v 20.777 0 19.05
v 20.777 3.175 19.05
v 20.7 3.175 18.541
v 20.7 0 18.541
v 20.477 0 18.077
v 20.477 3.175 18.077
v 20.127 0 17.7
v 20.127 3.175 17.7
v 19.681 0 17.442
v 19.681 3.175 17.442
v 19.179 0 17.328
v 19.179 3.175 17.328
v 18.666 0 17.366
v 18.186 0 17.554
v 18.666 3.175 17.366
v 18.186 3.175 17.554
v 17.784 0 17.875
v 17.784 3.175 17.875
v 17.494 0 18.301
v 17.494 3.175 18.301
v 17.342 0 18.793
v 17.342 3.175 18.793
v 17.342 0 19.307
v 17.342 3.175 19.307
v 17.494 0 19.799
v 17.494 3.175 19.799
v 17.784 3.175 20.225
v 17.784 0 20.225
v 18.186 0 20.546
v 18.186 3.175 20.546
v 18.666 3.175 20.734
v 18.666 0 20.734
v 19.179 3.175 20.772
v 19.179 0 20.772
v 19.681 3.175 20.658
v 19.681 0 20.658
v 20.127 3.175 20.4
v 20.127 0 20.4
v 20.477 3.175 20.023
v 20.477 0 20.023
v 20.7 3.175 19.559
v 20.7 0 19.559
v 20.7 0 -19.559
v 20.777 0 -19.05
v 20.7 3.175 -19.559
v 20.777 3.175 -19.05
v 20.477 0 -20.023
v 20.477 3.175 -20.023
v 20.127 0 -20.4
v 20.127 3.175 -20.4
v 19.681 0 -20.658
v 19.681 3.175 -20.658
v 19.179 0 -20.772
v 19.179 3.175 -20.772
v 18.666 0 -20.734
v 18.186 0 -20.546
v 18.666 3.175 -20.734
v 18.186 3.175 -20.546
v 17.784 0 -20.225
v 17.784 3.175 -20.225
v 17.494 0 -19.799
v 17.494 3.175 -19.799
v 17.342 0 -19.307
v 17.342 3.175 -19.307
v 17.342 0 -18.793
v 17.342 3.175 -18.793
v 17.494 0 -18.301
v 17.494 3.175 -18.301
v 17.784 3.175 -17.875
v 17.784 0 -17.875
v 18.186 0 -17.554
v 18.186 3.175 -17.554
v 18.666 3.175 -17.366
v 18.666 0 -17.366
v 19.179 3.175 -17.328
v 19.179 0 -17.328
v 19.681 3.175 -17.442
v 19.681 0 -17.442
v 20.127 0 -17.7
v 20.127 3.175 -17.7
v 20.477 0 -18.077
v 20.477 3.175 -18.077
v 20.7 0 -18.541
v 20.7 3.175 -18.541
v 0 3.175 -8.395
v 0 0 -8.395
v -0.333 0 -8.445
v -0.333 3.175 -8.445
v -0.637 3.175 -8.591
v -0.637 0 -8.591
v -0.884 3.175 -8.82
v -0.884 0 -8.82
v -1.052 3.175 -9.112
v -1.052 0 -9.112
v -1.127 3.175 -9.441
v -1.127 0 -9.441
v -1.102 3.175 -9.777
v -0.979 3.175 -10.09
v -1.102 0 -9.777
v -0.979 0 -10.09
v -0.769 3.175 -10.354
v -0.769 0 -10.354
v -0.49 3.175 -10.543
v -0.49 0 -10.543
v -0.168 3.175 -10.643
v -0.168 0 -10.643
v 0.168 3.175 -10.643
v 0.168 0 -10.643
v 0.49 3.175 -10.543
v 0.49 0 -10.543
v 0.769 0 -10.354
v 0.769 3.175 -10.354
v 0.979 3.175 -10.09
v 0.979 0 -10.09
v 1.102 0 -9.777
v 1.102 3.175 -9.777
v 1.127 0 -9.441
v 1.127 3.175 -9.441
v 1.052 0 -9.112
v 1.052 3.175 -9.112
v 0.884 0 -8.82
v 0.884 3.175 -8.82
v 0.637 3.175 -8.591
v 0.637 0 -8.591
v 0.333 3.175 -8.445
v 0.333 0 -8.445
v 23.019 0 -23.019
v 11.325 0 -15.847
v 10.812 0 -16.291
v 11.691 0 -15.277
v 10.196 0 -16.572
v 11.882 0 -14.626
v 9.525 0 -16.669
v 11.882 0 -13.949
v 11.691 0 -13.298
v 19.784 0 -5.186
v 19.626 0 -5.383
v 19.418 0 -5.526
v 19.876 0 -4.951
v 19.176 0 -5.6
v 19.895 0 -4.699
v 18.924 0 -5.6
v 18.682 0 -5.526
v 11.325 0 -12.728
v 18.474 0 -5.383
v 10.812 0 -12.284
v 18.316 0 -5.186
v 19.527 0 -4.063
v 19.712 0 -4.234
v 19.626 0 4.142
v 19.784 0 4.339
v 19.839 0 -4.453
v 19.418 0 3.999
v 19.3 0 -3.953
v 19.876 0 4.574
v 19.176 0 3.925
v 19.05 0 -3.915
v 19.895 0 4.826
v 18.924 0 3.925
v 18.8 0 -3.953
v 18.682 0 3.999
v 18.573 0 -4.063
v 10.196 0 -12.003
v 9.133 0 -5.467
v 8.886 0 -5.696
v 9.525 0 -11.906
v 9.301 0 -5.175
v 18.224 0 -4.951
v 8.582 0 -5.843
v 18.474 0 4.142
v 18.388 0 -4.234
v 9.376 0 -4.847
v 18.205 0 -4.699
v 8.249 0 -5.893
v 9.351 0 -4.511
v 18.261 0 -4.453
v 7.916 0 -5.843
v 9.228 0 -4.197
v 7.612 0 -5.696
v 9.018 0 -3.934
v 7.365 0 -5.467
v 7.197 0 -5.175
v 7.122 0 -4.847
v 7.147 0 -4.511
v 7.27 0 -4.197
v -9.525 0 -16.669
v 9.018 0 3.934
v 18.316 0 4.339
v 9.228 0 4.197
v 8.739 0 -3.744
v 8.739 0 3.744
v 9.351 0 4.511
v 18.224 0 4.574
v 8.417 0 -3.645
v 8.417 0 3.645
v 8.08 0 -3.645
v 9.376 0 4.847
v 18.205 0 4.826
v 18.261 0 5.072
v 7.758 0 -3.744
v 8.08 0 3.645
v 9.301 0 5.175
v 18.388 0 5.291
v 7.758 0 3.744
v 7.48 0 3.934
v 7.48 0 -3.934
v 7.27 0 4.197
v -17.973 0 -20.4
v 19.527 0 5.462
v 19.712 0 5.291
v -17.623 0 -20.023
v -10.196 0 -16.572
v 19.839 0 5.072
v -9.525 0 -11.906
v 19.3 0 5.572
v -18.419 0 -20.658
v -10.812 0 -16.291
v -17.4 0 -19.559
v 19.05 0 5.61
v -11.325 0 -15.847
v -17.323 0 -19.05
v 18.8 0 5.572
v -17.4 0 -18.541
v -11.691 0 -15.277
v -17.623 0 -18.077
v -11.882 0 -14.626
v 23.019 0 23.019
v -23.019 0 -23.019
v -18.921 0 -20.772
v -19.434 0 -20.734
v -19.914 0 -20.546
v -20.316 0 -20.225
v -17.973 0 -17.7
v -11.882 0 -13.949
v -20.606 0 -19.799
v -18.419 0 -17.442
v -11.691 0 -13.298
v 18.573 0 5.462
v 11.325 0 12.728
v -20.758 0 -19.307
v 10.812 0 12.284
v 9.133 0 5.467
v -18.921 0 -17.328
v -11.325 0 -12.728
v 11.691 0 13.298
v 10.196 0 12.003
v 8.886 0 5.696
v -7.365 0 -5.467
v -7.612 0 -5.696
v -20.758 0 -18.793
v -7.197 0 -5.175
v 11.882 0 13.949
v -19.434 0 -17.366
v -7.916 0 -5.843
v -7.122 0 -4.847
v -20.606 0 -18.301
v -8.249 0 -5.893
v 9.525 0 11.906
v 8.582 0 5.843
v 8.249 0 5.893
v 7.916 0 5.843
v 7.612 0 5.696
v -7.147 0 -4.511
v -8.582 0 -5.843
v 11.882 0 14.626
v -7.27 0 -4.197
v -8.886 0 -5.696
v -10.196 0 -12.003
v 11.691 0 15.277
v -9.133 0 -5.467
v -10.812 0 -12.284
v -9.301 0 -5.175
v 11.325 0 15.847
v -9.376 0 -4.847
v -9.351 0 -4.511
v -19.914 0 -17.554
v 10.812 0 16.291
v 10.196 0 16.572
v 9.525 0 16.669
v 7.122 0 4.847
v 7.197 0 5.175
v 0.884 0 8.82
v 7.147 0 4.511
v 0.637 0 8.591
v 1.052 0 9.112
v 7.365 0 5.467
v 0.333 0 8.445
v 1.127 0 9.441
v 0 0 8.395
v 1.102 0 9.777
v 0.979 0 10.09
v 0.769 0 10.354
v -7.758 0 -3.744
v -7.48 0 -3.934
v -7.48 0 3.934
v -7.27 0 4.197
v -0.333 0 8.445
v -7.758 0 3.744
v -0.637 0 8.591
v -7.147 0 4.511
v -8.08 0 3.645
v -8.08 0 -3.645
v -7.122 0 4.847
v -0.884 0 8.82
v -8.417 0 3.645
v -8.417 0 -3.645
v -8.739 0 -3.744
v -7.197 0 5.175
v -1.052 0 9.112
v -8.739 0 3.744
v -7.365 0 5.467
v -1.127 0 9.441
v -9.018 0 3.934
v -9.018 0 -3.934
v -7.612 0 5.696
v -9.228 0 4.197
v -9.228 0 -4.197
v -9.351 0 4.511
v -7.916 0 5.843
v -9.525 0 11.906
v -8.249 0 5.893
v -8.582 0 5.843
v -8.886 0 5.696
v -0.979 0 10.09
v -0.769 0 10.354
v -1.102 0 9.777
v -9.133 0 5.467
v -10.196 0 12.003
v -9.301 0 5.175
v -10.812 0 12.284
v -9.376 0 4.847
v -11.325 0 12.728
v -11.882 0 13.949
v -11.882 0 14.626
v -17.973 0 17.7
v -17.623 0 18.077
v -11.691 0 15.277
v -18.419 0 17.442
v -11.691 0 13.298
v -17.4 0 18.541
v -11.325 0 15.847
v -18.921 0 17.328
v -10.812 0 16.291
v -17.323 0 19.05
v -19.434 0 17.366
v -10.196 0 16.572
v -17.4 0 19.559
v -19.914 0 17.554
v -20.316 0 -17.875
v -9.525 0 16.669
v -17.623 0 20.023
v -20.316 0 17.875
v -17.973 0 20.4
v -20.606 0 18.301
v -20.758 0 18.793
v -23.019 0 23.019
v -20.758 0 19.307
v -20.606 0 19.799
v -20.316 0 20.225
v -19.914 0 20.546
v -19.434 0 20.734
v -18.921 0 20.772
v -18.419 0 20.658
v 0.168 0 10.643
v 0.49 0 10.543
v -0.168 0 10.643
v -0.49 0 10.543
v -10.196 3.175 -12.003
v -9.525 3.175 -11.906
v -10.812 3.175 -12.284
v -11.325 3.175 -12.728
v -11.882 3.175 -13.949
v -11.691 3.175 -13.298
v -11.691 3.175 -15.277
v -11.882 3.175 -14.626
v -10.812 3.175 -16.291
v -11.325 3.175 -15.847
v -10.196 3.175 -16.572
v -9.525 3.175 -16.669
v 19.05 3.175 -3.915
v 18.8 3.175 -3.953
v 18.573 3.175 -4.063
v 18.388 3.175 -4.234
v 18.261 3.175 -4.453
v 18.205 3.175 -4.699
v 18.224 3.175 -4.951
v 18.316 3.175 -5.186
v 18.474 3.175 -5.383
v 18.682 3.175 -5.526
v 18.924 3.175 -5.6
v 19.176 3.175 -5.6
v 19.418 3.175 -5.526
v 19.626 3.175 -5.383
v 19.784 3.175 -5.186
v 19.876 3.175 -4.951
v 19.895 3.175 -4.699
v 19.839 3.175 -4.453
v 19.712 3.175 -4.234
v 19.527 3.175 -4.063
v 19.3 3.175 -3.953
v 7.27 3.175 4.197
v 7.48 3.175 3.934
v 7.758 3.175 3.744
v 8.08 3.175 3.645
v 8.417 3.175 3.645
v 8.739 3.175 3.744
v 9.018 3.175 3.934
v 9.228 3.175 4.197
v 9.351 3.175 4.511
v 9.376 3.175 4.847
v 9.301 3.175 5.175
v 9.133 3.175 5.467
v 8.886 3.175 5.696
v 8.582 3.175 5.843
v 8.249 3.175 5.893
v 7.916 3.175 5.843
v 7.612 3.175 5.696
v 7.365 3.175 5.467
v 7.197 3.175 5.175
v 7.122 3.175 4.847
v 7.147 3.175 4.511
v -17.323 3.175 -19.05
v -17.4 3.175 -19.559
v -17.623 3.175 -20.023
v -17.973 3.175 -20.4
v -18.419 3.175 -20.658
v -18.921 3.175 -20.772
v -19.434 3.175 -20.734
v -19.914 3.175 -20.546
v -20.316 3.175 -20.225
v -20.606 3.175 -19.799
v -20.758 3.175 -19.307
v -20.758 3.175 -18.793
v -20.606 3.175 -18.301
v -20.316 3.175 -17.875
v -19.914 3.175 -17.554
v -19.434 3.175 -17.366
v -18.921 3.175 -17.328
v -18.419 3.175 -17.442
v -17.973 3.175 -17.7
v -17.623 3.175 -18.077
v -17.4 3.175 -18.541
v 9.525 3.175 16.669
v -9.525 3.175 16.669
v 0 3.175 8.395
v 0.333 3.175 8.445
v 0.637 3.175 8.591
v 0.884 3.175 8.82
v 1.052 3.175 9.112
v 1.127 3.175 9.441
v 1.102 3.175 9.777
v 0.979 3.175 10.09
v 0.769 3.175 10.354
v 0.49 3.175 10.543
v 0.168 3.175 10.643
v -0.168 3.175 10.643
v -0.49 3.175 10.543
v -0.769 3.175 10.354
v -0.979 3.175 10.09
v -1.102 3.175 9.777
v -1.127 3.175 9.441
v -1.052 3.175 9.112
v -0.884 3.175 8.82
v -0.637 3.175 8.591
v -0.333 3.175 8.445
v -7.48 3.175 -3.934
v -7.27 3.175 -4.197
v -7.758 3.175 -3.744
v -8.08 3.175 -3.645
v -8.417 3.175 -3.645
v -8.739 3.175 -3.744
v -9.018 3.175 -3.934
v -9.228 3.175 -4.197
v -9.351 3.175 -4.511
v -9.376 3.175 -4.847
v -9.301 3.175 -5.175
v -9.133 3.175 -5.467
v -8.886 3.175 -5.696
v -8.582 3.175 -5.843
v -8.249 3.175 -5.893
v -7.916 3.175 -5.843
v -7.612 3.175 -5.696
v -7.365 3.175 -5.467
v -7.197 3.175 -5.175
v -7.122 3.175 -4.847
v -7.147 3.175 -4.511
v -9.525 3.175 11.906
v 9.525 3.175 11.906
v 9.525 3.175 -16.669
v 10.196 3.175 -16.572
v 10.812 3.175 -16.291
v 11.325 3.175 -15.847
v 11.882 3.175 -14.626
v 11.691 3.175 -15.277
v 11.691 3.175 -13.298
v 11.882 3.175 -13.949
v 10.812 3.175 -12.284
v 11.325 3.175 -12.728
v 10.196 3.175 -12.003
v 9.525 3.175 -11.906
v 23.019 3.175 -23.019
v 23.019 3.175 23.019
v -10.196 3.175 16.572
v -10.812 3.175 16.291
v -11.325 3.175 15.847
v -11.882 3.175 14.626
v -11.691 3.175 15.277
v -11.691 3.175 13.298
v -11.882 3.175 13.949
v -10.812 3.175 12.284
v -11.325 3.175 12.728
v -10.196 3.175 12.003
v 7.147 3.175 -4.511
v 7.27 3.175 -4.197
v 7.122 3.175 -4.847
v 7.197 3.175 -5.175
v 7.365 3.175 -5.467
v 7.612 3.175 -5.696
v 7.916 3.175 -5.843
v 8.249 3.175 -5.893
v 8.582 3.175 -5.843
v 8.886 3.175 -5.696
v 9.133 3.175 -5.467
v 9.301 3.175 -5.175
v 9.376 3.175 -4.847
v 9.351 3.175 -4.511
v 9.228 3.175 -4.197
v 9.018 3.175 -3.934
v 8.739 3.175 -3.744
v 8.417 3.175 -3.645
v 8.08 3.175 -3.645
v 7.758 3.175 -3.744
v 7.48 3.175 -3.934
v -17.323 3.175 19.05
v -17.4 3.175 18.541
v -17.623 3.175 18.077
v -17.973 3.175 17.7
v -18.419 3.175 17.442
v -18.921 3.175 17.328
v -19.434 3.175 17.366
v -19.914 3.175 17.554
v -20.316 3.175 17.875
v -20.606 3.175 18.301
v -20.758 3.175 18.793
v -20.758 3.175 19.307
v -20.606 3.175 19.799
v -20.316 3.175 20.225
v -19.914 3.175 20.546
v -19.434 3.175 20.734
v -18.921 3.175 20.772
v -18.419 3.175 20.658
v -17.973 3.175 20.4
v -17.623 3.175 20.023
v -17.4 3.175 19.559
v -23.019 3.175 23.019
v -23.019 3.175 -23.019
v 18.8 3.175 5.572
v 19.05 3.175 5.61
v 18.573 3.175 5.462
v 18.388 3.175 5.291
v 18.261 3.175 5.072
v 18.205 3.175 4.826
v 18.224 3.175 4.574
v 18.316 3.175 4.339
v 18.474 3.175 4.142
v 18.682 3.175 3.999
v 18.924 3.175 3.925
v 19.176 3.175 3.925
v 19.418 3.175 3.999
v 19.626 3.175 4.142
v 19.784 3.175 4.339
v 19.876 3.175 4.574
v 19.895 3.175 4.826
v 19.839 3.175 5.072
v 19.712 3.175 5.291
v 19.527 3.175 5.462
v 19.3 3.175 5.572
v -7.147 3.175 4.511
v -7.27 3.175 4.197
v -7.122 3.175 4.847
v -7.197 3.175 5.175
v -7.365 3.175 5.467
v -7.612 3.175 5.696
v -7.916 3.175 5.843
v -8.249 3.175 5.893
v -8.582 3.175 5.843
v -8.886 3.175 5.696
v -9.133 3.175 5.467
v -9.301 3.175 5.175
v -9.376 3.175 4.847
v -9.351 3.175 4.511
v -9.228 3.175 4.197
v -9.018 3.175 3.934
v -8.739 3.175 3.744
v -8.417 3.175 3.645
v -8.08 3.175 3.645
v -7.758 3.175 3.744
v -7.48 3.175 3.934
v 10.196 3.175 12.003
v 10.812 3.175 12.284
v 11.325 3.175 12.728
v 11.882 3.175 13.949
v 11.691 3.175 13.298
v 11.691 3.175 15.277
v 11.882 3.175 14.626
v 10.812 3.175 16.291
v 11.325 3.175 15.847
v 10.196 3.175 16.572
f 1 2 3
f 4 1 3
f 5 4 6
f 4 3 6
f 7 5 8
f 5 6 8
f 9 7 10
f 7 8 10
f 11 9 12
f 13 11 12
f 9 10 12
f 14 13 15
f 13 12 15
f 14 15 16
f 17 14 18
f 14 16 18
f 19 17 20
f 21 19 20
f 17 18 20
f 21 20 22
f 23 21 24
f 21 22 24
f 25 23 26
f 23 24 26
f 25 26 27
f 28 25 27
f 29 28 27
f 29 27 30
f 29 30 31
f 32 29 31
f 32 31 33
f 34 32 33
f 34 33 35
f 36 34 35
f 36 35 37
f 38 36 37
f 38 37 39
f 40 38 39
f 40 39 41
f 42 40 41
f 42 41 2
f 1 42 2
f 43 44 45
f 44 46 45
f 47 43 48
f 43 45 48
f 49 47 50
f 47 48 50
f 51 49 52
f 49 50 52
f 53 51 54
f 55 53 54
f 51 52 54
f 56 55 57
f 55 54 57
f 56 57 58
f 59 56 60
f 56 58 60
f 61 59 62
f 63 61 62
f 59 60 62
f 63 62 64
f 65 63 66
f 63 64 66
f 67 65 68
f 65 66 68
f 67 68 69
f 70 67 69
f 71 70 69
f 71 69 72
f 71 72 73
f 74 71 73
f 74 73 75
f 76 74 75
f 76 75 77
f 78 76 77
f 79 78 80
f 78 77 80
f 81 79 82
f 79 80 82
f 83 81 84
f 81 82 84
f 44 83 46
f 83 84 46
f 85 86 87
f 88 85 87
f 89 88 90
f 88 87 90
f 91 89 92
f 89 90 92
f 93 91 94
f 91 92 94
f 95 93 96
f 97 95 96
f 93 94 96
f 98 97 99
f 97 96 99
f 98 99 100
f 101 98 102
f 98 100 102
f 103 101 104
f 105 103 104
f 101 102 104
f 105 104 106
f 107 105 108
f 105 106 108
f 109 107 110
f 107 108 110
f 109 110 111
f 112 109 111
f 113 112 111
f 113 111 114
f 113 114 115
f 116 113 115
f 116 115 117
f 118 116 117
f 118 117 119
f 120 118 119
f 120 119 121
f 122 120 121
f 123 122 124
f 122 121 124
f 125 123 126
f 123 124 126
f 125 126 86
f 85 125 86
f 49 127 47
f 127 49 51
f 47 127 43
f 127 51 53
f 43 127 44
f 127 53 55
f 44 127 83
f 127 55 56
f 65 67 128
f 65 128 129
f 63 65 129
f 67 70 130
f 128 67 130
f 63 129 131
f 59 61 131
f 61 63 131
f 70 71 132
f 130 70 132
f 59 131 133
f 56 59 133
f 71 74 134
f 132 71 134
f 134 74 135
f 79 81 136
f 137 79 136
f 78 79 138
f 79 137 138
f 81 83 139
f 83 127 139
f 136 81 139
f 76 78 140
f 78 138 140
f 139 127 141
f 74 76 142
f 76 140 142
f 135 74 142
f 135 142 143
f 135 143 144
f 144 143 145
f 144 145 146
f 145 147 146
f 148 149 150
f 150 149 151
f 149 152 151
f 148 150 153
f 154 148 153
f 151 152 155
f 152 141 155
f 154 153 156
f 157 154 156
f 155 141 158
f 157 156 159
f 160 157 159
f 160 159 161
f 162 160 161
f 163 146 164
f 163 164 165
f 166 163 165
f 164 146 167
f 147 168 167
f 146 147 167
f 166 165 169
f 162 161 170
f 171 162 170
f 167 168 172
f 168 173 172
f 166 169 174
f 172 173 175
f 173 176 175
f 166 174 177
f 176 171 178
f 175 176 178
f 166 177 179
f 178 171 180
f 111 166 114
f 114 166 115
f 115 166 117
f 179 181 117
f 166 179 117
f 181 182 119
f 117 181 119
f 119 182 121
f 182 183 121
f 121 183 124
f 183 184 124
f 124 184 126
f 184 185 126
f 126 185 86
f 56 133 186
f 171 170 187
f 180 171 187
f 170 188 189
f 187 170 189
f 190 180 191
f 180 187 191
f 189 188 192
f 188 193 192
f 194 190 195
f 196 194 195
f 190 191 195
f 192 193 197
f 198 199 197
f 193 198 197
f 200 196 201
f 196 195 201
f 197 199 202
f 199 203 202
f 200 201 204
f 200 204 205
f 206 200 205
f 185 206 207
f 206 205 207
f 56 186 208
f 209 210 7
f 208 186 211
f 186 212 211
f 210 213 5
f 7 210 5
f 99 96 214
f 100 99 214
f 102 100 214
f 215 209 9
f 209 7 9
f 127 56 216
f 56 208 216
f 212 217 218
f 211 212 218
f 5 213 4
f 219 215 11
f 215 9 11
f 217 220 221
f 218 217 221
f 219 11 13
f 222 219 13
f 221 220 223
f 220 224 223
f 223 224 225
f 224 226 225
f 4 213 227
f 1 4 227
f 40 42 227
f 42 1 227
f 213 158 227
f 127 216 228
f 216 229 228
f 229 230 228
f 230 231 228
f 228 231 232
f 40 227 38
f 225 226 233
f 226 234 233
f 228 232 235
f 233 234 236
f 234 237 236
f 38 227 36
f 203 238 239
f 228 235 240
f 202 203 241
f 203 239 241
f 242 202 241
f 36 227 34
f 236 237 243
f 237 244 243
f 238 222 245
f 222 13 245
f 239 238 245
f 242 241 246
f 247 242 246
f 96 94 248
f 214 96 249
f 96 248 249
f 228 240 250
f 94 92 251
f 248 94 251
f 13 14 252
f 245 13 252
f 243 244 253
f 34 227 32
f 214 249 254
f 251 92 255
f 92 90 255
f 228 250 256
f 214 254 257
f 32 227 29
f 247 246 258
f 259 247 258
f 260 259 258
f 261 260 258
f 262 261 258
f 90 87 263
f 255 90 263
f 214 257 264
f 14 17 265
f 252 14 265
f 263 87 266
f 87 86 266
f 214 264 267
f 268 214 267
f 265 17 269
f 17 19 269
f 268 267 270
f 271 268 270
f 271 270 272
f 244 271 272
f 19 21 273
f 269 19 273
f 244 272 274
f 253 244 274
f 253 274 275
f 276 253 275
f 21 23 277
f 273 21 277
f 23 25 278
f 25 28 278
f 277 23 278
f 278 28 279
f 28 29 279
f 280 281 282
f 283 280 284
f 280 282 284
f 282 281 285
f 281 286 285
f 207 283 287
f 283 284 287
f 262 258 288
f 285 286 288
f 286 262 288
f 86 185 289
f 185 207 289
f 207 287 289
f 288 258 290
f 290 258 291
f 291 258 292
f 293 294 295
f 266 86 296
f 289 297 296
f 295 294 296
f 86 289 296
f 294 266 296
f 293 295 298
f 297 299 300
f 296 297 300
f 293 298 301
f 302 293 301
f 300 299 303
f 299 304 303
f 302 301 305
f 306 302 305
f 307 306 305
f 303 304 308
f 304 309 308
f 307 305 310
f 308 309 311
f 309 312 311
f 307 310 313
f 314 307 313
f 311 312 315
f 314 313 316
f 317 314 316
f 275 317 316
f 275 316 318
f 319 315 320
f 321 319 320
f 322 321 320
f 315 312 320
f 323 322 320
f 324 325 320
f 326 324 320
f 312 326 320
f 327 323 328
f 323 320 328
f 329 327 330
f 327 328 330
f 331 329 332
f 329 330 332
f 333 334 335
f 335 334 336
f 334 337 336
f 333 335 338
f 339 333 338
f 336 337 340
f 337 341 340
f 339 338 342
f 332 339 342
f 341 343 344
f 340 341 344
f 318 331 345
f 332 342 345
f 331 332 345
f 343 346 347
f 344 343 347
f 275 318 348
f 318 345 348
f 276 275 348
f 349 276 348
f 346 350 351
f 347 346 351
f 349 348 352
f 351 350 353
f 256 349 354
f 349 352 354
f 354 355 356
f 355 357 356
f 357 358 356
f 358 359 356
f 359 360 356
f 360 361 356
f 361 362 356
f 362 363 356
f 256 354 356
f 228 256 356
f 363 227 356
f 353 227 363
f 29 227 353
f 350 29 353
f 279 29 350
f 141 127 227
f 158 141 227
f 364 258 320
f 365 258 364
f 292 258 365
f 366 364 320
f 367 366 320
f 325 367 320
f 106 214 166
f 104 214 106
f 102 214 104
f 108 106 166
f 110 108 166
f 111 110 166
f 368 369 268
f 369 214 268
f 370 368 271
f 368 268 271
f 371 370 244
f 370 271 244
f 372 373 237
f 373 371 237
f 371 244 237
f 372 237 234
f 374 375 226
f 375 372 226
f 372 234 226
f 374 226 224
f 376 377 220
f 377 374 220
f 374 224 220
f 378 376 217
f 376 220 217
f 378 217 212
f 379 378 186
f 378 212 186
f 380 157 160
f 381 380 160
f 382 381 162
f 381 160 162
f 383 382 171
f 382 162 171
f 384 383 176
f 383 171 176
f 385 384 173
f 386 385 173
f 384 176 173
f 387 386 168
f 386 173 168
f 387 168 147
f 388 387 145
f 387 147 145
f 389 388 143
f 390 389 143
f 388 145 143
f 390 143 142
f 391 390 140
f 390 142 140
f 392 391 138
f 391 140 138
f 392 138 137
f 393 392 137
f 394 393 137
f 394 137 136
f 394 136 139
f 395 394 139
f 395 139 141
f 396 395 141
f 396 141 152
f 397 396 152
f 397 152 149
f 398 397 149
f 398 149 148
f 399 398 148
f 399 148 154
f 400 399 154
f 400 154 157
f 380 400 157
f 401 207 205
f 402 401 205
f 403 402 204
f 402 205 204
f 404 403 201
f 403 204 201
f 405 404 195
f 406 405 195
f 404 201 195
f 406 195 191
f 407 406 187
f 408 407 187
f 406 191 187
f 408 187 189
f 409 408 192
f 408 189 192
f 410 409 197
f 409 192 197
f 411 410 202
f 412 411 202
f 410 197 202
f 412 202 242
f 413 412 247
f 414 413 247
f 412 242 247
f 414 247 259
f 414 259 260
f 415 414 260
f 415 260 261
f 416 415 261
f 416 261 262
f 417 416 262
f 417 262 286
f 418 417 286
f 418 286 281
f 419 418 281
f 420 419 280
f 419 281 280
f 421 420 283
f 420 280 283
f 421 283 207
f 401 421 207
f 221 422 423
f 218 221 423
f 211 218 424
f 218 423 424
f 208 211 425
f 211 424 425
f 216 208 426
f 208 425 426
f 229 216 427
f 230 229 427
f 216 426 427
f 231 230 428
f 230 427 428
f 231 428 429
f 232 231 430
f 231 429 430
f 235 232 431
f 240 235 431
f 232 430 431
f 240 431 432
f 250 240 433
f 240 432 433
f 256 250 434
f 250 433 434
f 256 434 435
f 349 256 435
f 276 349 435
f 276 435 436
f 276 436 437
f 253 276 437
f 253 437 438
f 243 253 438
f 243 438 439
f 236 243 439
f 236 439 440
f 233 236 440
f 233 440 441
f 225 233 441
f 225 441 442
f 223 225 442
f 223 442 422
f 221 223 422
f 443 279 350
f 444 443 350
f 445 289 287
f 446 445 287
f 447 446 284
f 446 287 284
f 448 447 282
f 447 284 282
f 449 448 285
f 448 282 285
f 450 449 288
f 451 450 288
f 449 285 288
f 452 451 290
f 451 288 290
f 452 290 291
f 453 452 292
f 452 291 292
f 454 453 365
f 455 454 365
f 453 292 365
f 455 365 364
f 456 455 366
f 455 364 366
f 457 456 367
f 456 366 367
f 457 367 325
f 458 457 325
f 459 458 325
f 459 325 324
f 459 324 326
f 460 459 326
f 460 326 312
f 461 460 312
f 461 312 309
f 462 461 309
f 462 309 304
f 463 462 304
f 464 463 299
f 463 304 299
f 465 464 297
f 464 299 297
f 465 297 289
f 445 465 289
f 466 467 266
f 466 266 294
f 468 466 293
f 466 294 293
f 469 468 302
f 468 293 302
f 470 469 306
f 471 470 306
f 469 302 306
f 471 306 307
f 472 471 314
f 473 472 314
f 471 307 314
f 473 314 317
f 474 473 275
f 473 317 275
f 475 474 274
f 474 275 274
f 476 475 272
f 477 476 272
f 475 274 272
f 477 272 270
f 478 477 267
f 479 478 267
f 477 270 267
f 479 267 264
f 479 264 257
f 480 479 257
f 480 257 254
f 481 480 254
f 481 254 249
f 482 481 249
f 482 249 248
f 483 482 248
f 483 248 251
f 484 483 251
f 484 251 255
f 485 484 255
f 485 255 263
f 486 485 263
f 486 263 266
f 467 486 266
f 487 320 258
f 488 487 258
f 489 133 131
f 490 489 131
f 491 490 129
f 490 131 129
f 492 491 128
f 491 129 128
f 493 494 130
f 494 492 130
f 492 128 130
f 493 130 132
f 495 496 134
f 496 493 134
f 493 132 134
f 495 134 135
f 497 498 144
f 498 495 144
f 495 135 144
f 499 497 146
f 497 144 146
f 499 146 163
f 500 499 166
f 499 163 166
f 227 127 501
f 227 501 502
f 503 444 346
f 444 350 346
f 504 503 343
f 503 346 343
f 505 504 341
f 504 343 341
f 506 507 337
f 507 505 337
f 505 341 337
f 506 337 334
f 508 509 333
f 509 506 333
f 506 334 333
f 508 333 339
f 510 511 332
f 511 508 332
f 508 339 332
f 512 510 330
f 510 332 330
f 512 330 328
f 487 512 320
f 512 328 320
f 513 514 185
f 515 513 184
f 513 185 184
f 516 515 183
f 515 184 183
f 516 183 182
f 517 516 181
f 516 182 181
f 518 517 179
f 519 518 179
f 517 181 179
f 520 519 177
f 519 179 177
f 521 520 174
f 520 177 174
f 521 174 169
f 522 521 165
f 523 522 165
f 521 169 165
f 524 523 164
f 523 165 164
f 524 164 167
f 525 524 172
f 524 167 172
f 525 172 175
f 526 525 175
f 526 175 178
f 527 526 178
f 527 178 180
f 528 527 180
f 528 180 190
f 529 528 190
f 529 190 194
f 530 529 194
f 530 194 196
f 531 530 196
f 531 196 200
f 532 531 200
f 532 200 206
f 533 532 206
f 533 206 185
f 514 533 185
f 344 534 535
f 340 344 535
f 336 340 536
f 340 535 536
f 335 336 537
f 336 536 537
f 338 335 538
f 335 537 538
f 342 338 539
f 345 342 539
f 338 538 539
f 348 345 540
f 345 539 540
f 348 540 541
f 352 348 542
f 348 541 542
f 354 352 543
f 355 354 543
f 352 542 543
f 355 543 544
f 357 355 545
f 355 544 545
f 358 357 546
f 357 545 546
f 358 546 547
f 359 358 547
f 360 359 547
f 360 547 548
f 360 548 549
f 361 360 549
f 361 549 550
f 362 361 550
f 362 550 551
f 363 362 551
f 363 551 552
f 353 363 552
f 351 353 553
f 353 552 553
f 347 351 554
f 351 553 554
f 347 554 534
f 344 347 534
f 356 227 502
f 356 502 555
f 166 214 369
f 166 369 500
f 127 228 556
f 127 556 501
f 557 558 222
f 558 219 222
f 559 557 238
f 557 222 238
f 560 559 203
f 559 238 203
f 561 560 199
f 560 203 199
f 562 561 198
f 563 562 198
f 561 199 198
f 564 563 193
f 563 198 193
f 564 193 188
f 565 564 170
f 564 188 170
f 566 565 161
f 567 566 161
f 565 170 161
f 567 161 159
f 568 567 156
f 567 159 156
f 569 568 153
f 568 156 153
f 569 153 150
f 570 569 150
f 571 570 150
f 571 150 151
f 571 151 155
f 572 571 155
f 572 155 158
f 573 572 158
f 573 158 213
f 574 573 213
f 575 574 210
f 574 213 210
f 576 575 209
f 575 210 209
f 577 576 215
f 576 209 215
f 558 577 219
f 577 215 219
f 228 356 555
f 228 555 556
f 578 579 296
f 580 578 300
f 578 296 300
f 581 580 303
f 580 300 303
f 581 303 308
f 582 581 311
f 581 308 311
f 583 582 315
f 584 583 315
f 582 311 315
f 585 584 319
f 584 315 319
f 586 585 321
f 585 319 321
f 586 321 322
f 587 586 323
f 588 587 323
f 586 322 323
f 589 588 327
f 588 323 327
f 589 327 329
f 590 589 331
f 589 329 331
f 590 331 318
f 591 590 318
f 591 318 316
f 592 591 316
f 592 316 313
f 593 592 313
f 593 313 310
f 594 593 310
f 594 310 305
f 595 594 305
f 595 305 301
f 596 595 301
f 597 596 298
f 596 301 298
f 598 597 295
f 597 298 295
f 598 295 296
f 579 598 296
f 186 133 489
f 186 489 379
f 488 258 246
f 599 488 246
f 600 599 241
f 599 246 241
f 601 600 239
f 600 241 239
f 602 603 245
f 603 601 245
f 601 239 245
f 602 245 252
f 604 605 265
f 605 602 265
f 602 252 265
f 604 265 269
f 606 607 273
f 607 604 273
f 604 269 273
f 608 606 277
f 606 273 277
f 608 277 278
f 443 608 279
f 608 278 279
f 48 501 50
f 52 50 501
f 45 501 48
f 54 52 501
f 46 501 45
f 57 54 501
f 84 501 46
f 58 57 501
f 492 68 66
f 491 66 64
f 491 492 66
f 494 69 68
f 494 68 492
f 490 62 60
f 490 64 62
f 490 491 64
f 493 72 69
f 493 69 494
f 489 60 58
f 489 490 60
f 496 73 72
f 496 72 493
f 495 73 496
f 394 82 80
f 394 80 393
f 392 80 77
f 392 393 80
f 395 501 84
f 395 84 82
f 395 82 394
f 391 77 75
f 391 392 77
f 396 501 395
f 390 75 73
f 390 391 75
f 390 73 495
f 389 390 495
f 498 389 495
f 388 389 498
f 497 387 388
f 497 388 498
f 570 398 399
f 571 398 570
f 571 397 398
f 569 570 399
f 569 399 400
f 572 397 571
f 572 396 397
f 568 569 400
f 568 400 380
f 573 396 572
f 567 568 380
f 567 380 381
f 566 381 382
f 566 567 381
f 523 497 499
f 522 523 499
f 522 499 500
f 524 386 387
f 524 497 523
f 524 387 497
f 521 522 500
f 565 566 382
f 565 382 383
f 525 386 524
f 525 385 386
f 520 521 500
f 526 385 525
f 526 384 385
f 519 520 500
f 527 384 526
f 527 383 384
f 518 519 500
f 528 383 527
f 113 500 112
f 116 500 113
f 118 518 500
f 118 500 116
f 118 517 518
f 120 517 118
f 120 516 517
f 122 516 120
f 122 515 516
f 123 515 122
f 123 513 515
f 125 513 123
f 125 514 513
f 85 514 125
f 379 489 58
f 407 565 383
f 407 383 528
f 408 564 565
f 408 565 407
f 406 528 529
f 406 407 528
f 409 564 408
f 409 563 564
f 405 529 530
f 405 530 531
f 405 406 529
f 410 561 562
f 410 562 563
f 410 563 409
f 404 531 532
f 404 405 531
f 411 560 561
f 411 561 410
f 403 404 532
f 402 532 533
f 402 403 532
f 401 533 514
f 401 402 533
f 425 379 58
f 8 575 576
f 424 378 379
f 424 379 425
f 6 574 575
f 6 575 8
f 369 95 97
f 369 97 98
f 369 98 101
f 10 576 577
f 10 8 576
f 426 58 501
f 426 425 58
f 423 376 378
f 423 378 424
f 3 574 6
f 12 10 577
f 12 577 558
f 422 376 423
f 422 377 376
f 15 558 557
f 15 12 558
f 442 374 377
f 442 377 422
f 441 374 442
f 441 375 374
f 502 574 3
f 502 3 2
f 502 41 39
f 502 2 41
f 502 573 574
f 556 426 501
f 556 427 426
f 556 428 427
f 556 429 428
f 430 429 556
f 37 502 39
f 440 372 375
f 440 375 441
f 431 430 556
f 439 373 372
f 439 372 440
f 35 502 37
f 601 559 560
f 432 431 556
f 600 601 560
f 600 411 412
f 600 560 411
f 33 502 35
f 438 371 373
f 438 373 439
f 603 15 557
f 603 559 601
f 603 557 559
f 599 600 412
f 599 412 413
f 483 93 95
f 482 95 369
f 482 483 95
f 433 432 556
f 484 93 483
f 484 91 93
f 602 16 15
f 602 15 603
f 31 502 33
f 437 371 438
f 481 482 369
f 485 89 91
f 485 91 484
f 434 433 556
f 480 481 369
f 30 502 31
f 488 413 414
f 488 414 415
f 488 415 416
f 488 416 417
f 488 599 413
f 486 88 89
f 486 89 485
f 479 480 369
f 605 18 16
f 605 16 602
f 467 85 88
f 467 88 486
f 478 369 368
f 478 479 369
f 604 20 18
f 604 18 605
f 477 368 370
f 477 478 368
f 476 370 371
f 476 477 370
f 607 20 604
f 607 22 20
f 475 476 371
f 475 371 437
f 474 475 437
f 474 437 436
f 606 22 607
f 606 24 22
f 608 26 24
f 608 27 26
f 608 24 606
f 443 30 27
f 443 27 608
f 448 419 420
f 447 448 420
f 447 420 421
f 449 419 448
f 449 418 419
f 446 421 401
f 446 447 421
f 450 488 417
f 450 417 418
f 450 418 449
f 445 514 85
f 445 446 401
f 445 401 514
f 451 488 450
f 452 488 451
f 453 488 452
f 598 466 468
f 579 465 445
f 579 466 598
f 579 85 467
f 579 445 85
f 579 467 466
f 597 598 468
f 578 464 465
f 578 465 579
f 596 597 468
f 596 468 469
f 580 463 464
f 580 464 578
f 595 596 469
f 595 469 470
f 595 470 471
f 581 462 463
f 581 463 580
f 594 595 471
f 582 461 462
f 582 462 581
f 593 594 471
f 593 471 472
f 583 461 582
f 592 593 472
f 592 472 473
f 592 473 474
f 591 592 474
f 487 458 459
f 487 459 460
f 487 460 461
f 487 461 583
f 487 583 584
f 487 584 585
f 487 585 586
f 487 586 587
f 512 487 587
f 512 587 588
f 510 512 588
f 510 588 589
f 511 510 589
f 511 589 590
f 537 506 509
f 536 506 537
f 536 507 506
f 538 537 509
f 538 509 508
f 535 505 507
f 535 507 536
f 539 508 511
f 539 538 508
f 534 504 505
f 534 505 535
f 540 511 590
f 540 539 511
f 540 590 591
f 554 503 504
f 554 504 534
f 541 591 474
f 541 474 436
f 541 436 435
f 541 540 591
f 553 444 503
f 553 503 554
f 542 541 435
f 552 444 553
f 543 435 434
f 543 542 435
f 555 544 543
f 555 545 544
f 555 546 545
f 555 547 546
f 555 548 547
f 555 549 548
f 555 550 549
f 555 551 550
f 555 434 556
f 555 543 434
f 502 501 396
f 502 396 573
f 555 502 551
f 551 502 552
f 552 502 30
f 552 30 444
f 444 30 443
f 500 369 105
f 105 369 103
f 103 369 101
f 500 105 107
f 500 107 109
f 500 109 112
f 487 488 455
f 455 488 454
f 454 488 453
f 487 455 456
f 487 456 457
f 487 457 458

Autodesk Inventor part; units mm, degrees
ref_plane "YZ Plane" through (0, 0, 0) normal (1, 0, 0) x (0, 1, 0)
ref_plane "XZ Plane" through (0, 0, 0) normal (0, 1, 0) x (-1, 0, 0)
ref_plane "XY Plane" through (0, 0, 0) normal (0, 0, 1) x (1, 0, 0)
sketch "Sketch1" plane through (0, 0, 0) normal (0, 1, 0) x (-1, 0, 0)
  line L0 (23.0187, -23.0187) -> (-23.0187, -23.0187)
  line L1 (-23.0187, -23.0187) -> (-23.0187, 23.0187)
  line L2 (-23.0187, 23.0187) -> (23.0187, 23.0187)
  line L3 (23.0187, 23.0187) -> (23.0187, -23.0187)
  line L4 (23.0187, -23.0187) -> (-23.0187, 23.0187) construction
  line L5 (-23.0187, -23.0187) -> (23.0187, 23.0187) construction
  line L6 (9.525, -14.2875) -> (-9.525, -14.2875) construction
  line L7 (9.525, -11.9062) -> (-9.525, -11.9062)
  line L8 (-9.525, -16.6688) -> (9.525, -16.6688)
  arc A0 (9.525, -16.6688) -> (9.525, -11.9062) centre (9.525, -14.2875) ccw
  arc A1 (-9.525, -11.9062) -> (-9.525, -16.6688) centre (-9.525, -14.2875) ccw
  line L9 (0, -32.2263) -> (0, 32.2263) construction
  line L10 (32.2263, 0) -> (-32.2263, 0) construction
  line L11 (9.525, 14.2875) -> (-9.525, 14.2875) construction
  line L12 (9.525, 11.9062) -> (-9.525, 11.9062)
  line L13 (-9.525, 16.6688) -> (9.525, 16.6688)
  arc A2 (9.525, 11.9062) -> (9.525, 16.6688) centre (9.525, 14.2875) ccw
  arc A3 (-9.525, 16.6688) -> (-9.525, 11.9062) centre (-9.525, 14.2875) ccw
  point P0 (0, 0)
  point P1 (0, -14.2875)
  point P2 (0, 14.2875)
  dimension "d0" = 46.0375
  dimension "d1" = 46.0375
  dimension "d2" = 19.05
  dimension "d3" = 4.7625
  dimension "d4" = 11.9062
  dimension "d5" = 11.9062
extrude "Extrusion1" add sketch "Sketch1" along normal blind 3.175
sketch "Sketch2" plane through (0, 3.175, 0) normal (0, 1, 0) x (1, 0, 0)
  line L0 (-23.0187, -23.0187) -> (23.0187, -23.0187) construction
  line L1 (23.0187, -23.0187) -> (23.0187, 23.0187) construction
  line L2 (23.0187, 23.0187) -> (-23.0187, 23.0187) construction
  line L3 (-23.0187, 23.0187) -> (-23.0187, -23.0187) construction
  line L4 (9.525, 11.9062) -> (-9.525, 11.9062) construction
  arc A0 (-9.525, 16.6688) -> (-9.525, 11.9062) centre (-9.525, 14.2875) ccw construction
  line L5 (-9.525, 16.6688) -> (9.525, 16.6688) construction
  arc A1 (9.525, 11.9062) -> (9.525, 16.6688) centre (9.525, 14.2875) ccw construction
  line L6 (9.525, -16.6688) -> (-9.525, -16.6688) construction
  arc A2 (-9.525, -11.9062) -> (-9.525, -16.6688) centre (-9.525, -14.2875) ccw construction
  line L7 (-9.525, -11.9062) -> (9.525, -11.9062) construction
  arc A3 (9.525, -16.6688) -> (9.525, -11.9062) centre (9.525, -14.2875) ccw construction
  circle A4 centre (0, 0) radius 9.525 construction
  line L8 (0, 32.2263) -> (0, -32.2263) construction
  point P0 (0, 9.525)
  dimension "d8" = 19.05
hole "Hole1" at (0, 3.175, -9.525) direction (0, -1, 0) diameter 2.2606 end through all
pattern_circular "Circular Pattern1" count 6 over 360 about axis through (0, -10, 0) along (0, 1, 0) of "Hole1"
sketch "Sketch4" plane through (0, 3.175, 0) normal (0, 1, 0) x (1, 0, 0)
  circle A0 centre (-19.05, 19.05) radius 1.7272
  circle A1 centre (19.05, 19.05) radius 1.7272
  circle A2 centre (8.2489, 4.7625) radius 1.1303 construction
  circle A3 centre (8.2489, -4.7625) radius 1.1303 construction
  circle A4 centre (0, -9.525) radius 1.1303 construction
  circle A5 centre (-8.2489, -4.7625) radius 1.1303 construction
  circle A6 centre (-8.2489, 4.7625) radius 1.1303 construction
  circle A7 centre (0, 9.525) radius 1.1303 construction
  line L0 (-23.0187, -23.0187) -> (23.0187, -23.0187) construction
  line L1 (23.0187, -23.0187) -> (23.0187, 23.0187) construction
  line L2 (23.0187, 23.0187) -> (-23.0187, 23.0187) construction
  line L3 (-23.0187, 23.0187) -> (-23.0187, -23.0187) construction
  line L4 (9.525, 11.9062) -> (-9.525, 11.9062) construction
  arc A8 (-9.525, 16.6688) -> (-9.525, 11.9062) centre (-9.525, 14.2875) ccw construction
  line L5 (-9.525, 16.6688) -> (9.525, 16.6688) construction
  arc A9 (9.525, 11.9062) -> (9.525, 16.6688) centre (9.525, 14.2875) ccw construction
  line L6 (9.525, -16.6688) -> (-9.525, -16.6688) construction
  arc A10 (-9.525, -11.9062) -> (-9.525, -16.6688) centre (-9.525, -14.2875) ccw construction
  line L7 (-9.525, -11.9062) -> (9.525, -11.9062) construction
  arc A11 (9.525, -16.6688) -> (9.525, -11.9062) centre (9.525, -14.2875) ccw construction
  line L8 (0, 32.2263) -> (0, -32.2263) construction
  line L9 (-32.2263, 0) -> (32.2263, 0) construction
  circle A12 centre (-19.05, -19.05) radius 1.7272
  circle A13 centre (19.05, -19.05) radius 1.7272
  point P0 (0, 0)
  dimension "d19" = 3.4544
  dimension "d20" = 38.1
  dimension "d21" = 19.05
  dimension "d22" = 38.1
  dimension "d23" = 38.1
extrude "Extrusion2" cut sketch "Sketch4" against normal blind 3.175
sketch "Sketch5" plane through (0, 3.175, 0) normal (0, 1, 0) x (1, 0, 0)
  circle A0 centre (-19.05, -19.05) radius 1.7272 construction
  circle A1 centre (19.05, 19.05) radius 1.7272 construction
  circle A2 centre (19.05, -19.05) radius 1.7272 construction
  circle A3 centre (-19.05, 19.05) radius 1.7272 construction
  circle A4 centre (8.2489, 4.7625) radius 1.1303 construction
  circle A5 centre (8.2489, -4.7625) radius 1.1303 construction
  circle A6 centre (0, -9.525) radius 1.1303 construction
  circle A7 centre (-8.2489, -4.7625) radius 1.1303 construction
  circle A8 centre (-8.2489, 4.7625) radius 1.1303 construction
  circle A9 centre (0, 9.525) radius 1.1303 construction
  line L0 (-23.0187, -23.0187) -> (23.0187, -23.0187) construction
  line L1 (23.0187, -23.0187) -> (23.0187, 23.0187) construction
  line L2 (23.0187, 23.0187) -> (-23.0187, 23.0187) construction
  line L3 (-23.0187, 23.0187) -> (-23.0187, -23.0187) construction
  line L4 (9.525, 11.9062) -> (-9.525, 11.9062) construction
  arc A10 (-9.525, 16.6688) -> (-9.525, 11.9062) centre (-9.525, 14.2875) ccw construction
  line L5 (-9.525, 16.6688) -> (9.525, 16.6688) construction
  arc A11 (9.525, 11.9062) -> (9.525, 16.6688) centre (9.525, 14.2875) ccw construction
  line L6 (9.525, -16.6688) -> (-9.525, -16.6688) construction
  arc A12 (-9.525, -11.9062) -> (-9.525, -16.6688) centre (-9.525, -14.2875) ccw construction
  line L7 (-9.525, -11.9062) -> (9.525, -11.9062) construction
  arc A13 (9.525, -16.6688) -> (9.525, -11.9062) centre (9.525, -14.2875) ccw construction
  line L8 (-32.2263, 0) -> (32.2263, 0) construction
  line L9 (0, 32.2263) -> (0, -32.2263) construction
  circle A14 centre (19.05, -19.05) radius 1.7272 construction
  line L10 (19.05, 19.05) -> (19.05, -19.05) construction
  point P0 (0, 0)
  point P1 (19.05, 4.7625)
  point P2 (19.05, -4.7625)
  dimension "d26" = 9.525
  dimension "d27" = 4.7625
hole "Hole2" at (19.05, 3.175, -4.7625) at (19.05, 3.175, 4.7625) direction (0, -1, 0) diameter 1.6942 end through all thread size "2-56 UNC" class "2B" standard "ANSI Unified Screw Threads"
equation "\"d21\" = 0.5 * d20"
equation "\"d27\" = 0.5 * d26"
properties part number "Table"
